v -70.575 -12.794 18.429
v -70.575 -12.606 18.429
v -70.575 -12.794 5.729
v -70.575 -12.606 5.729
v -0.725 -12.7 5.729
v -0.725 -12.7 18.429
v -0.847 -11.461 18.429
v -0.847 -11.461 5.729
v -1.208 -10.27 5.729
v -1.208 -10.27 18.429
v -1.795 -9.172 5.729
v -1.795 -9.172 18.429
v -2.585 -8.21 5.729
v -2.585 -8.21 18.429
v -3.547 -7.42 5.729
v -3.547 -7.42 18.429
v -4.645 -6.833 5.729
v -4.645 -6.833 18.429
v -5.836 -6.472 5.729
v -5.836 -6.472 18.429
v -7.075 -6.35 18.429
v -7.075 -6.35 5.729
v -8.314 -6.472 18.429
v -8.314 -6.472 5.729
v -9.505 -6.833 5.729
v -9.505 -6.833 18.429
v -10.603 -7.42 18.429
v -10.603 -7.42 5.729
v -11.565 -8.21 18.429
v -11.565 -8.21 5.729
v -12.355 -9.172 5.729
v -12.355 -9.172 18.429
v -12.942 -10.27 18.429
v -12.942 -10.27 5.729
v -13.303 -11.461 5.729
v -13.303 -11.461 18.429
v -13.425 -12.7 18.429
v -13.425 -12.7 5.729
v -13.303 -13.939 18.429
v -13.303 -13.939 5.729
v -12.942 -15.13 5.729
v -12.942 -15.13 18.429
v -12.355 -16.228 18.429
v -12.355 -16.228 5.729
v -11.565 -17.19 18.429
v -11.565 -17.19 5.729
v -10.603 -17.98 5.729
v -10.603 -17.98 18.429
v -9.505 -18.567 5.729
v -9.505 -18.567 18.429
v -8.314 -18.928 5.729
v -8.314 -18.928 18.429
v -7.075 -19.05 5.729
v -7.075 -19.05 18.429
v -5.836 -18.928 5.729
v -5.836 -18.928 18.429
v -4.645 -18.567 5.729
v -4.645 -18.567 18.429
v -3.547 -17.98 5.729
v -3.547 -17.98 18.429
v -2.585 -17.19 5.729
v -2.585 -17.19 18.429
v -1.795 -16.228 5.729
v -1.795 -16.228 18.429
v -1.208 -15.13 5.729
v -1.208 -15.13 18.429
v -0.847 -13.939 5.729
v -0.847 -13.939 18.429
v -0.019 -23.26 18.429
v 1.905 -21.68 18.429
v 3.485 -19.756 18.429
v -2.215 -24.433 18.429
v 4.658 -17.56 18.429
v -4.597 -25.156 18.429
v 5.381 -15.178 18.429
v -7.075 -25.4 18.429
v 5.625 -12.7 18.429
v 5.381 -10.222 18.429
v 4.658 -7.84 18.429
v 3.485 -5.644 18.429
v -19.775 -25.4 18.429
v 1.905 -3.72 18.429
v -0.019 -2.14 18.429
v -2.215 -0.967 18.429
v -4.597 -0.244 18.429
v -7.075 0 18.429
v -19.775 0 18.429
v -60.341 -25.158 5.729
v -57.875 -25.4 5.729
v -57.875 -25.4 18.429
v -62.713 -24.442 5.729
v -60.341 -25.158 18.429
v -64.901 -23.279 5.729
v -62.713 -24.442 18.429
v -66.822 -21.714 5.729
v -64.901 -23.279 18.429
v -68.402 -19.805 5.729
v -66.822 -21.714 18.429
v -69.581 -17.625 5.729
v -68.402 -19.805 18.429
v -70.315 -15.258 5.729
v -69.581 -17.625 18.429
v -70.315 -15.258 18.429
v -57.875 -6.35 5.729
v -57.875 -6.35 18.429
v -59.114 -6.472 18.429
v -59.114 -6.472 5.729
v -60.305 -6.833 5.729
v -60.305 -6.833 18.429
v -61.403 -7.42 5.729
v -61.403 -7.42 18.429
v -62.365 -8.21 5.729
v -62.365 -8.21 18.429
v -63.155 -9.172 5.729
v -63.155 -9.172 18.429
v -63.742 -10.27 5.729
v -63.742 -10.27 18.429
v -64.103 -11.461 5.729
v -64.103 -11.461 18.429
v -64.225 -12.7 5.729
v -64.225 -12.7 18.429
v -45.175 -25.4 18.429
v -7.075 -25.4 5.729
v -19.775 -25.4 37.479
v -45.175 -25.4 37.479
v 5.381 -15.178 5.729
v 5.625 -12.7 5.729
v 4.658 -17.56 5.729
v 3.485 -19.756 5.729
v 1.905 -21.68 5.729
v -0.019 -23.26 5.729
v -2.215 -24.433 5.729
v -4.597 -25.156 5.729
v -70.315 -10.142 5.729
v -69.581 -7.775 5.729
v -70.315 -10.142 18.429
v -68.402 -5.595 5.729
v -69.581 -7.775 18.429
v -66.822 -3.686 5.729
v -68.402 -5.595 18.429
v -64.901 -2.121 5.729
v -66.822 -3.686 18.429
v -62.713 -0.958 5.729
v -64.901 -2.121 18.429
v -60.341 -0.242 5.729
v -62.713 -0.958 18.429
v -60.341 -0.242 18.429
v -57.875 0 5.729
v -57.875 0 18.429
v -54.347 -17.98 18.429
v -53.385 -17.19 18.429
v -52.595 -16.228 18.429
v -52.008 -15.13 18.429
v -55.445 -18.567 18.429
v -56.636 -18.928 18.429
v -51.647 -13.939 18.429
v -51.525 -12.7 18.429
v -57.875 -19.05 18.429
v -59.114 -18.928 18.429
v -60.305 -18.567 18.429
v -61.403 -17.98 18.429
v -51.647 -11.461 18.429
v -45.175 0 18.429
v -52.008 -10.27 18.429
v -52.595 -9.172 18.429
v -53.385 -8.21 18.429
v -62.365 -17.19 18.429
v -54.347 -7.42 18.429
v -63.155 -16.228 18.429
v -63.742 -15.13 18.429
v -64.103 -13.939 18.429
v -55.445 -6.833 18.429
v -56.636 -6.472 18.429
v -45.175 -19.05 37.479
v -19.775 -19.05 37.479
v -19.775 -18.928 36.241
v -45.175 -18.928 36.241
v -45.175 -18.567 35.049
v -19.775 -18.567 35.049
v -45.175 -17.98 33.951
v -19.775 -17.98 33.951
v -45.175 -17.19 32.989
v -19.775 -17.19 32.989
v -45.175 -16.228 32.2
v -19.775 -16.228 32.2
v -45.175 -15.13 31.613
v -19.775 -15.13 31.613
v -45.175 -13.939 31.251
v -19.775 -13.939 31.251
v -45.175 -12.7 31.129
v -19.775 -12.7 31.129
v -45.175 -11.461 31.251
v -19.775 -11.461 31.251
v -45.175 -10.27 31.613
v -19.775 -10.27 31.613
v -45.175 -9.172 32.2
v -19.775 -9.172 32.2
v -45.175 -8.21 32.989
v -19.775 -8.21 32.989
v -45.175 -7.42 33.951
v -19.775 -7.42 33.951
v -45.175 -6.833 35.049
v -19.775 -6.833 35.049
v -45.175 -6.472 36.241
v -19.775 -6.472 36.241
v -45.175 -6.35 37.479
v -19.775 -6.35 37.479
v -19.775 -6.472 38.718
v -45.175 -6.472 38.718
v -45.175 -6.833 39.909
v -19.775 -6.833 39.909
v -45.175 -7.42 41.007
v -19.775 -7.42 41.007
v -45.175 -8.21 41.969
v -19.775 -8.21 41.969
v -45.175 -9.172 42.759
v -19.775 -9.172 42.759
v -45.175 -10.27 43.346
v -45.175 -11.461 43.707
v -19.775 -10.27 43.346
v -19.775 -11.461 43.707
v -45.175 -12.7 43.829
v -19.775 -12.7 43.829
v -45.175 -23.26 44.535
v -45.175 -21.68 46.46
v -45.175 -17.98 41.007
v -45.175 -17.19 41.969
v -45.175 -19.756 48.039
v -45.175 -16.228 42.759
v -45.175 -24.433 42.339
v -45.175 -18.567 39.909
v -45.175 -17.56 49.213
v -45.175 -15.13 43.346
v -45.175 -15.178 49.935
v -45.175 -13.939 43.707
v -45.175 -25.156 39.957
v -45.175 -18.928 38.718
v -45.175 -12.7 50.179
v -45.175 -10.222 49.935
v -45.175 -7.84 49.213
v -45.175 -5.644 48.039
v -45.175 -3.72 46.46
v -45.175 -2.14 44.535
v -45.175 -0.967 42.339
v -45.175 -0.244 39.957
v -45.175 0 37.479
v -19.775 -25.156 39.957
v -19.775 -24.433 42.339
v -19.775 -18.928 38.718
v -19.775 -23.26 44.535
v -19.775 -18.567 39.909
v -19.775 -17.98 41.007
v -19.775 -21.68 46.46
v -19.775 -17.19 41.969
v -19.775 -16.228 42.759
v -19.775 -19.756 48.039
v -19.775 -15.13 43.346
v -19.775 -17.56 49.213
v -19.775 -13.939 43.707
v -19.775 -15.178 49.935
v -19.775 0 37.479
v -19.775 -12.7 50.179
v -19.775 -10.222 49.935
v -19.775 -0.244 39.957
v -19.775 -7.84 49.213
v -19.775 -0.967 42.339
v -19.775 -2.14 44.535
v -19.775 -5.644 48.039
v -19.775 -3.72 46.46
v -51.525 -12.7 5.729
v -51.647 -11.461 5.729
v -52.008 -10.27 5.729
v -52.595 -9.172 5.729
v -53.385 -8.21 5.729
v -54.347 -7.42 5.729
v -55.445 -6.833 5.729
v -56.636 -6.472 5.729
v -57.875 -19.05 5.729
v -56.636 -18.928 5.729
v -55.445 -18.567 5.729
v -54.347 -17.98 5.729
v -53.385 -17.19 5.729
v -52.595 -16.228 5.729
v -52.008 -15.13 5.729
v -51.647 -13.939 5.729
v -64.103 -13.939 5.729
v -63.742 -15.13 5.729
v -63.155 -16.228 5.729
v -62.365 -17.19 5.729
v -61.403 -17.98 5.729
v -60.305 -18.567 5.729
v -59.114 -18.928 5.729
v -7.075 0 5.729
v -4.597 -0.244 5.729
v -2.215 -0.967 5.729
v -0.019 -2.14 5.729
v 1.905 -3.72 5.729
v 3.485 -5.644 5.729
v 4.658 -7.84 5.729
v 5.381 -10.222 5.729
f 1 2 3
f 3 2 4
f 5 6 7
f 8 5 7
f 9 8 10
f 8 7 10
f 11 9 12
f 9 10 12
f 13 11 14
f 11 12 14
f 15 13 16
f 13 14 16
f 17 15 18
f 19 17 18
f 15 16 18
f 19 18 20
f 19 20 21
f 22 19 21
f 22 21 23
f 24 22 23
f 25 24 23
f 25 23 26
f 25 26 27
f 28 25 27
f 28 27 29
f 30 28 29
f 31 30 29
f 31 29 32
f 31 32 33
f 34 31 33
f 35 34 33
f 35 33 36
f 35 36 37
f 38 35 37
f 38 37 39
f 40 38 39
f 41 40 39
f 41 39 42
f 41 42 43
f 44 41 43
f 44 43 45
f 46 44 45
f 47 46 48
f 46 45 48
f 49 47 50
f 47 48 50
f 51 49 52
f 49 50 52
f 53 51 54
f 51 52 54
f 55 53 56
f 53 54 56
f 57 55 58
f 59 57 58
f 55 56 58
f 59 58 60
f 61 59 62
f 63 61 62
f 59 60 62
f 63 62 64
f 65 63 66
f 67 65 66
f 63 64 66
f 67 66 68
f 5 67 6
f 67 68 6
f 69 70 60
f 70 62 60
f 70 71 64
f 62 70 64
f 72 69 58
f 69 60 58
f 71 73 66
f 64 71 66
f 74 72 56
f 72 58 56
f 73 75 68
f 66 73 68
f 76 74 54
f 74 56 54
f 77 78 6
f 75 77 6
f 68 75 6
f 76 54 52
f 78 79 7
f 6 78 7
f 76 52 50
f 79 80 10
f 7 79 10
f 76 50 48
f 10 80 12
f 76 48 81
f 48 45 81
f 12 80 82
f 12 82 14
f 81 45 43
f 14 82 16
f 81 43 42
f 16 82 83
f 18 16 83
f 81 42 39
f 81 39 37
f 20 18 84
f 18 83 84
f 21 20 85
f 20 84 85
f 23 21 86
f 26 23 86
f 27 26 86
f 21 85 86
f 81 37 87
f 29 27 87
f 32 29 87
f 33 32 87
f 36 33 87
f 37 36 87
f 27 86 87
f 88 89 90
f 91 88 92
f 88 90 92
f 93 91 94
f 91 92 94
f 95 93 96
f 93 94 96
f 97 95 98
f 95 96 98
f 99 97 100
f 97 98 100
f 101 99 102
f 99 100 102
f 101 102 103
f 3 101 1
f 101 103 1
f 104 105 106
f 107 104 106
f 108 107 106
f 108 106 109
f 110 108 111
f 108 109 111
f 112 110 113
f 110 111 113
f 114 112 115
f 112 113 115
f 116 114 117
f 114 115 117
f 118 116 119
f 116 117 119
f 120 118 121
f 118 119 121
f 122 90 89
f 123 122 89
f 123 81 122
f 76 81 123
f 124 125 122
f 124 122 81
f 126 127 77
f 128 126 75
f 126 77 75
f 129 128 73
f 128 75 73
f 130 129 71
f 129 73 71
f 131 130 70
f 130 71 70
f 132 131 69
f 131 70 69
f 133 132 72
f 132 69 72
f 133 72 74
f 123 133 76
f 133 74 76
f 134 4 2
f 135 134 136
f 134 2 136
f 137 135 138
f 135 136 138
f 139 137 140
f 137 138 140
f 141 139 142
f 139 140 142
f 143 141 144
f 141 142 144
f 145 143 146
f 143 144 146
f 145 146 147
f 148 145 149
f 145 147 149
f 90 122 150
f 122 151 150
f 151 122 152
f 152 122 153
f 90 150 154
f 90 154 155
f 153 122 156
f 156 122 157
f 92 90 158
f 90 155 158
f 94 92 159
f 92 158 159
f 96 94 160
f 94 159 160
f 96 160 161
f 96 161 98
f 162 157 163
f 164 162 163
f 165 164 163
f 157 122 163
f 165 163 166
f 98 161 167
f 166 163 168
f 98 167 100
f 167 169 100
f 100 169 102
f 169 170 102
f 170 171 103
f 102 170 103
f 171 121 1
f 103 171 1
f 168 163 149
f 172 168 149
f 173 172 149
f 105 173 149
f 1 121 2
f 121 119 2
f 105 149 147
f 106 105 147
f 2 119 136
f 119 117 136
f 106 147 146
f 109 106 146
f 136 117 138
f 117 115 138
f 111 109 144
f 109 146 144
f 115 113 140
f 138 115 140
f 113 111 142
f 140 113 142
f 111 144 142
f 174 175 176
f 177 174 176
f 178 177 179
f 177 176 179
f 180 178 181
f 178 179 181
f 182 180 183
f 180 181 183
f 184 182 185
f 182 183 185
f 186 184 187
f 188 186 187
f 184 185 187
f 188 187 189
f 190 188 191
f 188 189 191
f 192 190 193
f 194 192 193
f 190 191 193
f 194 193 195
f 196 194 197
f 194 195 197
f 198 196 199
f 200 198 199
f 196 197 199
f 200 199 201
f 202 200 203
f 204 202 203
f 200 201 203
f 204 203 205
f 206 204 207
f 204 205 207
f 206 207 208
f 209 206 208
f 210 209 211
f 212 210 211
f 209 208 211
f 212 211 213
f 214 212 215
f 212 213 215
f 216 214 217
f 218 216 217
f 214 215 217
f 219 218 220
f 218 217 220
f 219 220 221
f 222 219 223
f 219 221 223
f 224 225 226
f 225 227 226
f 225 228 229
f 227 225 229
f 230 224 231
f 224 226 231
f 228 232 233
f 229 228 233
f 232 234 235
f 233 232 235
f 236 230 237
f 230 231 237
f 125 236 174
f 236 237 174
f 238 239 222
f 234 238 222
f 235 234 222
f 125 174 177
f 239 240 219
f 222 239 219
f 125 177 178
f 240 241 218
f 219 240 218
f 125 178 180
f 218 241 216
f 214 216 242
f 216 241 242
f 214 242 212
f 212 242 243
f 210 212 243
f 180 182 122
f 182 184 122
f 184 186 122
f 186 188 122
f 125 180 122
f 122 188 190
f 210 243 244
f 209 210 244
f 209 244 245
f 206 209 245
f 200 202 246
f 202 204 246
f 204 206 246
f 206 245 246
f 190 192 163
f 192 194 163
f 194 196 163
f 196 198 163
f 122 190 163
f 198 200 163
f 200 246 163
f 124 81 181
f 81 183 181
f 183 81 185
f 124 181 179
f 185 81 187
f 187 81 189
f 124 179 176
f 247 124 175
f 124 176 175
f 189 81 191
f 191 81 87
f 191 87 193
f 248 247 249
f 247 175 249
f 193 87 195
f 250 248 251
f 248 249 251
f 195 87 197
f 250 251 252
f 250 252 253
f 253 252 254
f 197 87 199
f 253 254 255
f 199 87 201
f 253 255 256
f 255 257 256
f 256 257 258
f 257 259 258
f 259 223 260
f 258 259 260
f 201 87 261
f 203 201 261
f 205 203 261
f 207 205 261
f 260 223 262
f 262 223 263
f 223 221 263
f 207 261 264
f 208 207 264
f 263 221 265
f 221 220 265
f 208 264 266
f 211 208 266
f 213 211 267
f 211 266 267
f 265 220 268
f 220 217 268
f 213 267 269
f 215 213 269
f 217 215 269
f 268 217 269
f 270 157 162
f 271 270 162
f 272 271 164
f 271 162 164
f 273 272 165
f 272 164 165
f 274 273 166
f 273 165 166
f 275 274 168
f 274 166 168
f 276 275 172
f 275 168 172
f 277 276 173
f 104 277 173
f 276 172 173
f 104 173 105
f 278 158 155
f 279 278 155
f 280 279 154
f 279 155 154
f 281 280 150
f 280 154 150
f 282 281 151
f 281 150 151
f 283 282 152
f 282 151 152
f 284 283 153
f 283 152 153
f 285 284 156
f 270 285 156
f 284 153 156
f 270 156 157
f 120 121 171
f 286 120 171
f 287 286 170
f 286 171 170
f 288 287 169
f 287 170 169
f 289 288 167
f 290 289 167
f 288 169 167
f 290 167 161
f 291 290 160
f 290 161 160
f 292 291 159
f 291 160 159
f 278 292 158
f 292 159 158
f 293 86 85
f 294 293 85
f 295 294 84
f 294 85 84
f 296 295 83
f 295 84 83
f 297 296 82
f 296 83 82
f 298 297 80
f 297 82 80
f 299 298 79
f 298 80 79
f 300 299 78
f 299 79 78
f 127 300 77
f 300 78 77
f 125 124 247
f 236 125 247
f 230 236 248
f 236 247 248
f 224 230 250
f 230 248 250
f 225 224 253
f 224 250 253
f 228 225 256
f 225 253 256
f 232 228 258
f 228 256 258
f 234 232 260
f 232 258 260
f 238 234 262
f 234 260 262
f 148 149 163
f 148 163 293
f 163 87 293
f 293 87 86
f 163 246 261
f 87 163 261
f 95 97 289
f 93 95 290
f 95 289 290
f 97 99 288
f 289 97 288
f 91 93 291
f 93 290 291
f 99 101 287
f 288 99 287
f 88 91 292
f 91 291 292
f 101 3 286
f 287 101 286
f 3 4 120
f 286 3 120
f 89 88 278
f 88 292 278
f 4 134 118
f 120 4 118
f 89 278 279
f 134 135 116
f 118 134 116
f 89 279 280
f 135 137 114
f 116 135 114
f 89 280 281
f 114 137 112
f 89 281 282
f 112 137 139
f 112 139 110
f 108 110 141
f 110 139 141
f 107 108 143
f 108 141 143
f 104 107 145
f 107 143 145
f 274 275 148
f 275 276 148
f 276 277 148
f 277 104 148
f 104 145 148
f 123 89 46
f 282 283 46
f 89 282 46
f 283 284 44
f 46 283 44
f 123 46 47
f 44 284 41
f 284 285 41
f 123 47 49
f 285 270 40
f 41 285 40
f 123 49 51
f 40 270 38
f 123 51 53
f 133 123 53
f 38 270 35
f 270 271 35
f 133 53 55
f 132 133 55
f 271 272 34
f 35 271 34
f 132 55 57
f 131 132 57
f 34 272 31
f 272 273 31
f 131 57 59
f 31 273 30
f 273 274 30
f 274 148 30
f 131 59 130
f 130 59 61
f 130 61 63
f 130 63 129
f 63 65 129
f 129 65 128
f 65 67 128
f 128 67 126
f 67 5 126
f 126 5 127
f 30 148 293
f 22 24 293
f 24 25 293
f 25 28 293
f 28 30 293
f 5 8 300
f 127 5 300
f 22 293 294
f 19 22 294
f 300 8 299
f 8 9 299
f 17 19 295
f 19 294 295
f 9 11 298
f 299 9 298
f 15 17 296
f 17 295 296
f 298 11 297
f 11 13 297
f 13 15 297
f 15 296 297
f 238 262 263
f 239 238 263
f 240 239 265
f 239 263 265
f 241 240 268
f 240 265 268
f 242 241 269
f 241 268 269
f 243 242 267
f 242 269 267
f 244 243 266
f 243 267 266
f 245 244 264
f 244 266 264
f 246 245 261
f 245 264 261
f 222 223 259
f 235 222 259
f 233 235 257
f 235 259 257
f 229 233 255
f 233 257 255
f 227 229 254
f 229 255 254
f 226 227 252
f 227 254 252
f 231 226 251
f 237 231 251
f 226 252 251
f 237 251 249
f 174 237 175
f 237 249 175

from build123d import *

# Parameters (mm, degrees)
F1_DEPTH = 25.4
F2_R     = 6.35
F3_DEPTH = 12.701
F5_DEPTH = 50.801
F7_DEPTH = 12.701


with BuildPart() as f1:
    # F0 (on Front) → F1 (new body)
    with BuildSketch(Plane.XZ):
        Polygon((-70.5749627616, 18.429359109), (-70.5749627616, 5.729359109), (5.6250372384, 5.729359109), (5.6250372384, 18.429359109), (-19.7749627616, 18.429359109), (-19.7749627616, 50.179359109), (-45.1749627616, 50.179359109), (-45.1749627616, 18.429359109), align=None)
    extrude(amount=F1_DEPTH)

    # F2 (on face) → F3 (cut, through all)
    with BuildSketch(Plane.XY.offset(18.429359109)):
        with Locations((-7.0749627616, -12.7)):
            Circle(F2_R)
        with BuildLine():
            ThreePointArc((5.6250372384, -12.7), (1.9052933594, -21.6802561211), (-7.0749627616, -25.4))
            Line((-7.0749627616, -25.4), (5.6250372384, -25.4))
            Line((5.6250372384, -25.4), (5.6250372384, -12.7))
        make_face()
        with BuildLine():
            ThreePointArc((-7.0749627616, 0), (1.9052933594, -3.7197438789), (5.6250372384, -12.7))
            Line((5.6250372384, -12.7), (5.6250372384, 0))
            Line((5.6250372384, 0), (-7.0749627616, 0))
        make_face()
    extrude(amount=-F3_DEPTH, mode=Mode.SUBTRACT)

    # F4 (on face) → F5 (cut, through all)
    with BuildSketch(Plane.YZ.offset(-19.7749627616)):
        with BuildLine():
            ThreePointArc((-19.05, 37.479359109), (-12.7, 31.129359109), (-6.35, 37.479359109))
            ThreePointArc((-6.35, 37.479359109), (-8.2098719395, 41.9694871695), (-12.7, 43.829359109))
            ThreePointArc((-12.7, 43.829359109), (-17.1901280605, 41.9694871695), (-19.05, 37.479359109))
        make_face()
        with BuildLine():
            ThreePointArc((-25.4, 37.479359109), (-21.6802561211, 46.45961523), (-12.7, 50.179359109))
            Line((-12.7, 50.179359109), (-25.4, 50.179359109))
            Line((-25.4, 50.179359109), (-25.4, 37.479359109))
        make_face()
        with BuildLine():
            ThreePointArc((-12.7, 50.179359109), (-3.7197438789, 46.45961523), (0, 37.479359109))
            Line((0, 37.479359109), (0, 50.179359109))
            Line((0, 50.179359109), (-12.7, 50.179359109))
        make_face()
    extrude(amount=-F5_DEPTH, mode=Mode.SUBTRACT)

    # F6 (on face) → F7 (cut, through all)
    with BuildSketch(Plane.XY.offset(18.429359109)):
        with BuildLine():
            ThreePointArc((-70.5749627616, -12.60582854), (-66.8220875421, -3.6863877476), (-57.8749627616, 0))
            Line((-57.8749627616, 0), (-70.5749627616, 0))
            Line((-70.5749627616, 0), (-70.5749627616, -12.60582854))
        make_face()
        with BuildLine():
            Line((-70.5749627616, -25.4), (-57.8749627616, -25.4))
            ThreePointArc((-57.8749627616, -25.4), (-66.8220875421, -21.7136122524), (-70.5749627616, -12.79417146))
            Line((-70.5749627616, -12.79417146), (-70.5749627616, -25.4))
        make_face()
        with BuildLine():
            ThreePointArc((-57.8749627616, -19.05), (-53.3848347011, -17.1901280605), (-51.5249627616, -12.7))
            ThreePointArc((-51.5249627616, -12.7), (-53.3848347011, -8.2098719395), (-57.8749627616, -6.35))
            ThreePointArc((-57.8749627616, -6.35), (-62.3650908222, -8.2098719395), (-64.2249627616, -12.7))
            ThreePointArc((-64.2249627616, -12.7), (-62.3650908222, -17.1901280605), (-57.8749627616, -19.05))
        make_face()
    extrude(amount=-F7_DEPTH, mode=Mode.SUBTRACT)


solid = f1.part
